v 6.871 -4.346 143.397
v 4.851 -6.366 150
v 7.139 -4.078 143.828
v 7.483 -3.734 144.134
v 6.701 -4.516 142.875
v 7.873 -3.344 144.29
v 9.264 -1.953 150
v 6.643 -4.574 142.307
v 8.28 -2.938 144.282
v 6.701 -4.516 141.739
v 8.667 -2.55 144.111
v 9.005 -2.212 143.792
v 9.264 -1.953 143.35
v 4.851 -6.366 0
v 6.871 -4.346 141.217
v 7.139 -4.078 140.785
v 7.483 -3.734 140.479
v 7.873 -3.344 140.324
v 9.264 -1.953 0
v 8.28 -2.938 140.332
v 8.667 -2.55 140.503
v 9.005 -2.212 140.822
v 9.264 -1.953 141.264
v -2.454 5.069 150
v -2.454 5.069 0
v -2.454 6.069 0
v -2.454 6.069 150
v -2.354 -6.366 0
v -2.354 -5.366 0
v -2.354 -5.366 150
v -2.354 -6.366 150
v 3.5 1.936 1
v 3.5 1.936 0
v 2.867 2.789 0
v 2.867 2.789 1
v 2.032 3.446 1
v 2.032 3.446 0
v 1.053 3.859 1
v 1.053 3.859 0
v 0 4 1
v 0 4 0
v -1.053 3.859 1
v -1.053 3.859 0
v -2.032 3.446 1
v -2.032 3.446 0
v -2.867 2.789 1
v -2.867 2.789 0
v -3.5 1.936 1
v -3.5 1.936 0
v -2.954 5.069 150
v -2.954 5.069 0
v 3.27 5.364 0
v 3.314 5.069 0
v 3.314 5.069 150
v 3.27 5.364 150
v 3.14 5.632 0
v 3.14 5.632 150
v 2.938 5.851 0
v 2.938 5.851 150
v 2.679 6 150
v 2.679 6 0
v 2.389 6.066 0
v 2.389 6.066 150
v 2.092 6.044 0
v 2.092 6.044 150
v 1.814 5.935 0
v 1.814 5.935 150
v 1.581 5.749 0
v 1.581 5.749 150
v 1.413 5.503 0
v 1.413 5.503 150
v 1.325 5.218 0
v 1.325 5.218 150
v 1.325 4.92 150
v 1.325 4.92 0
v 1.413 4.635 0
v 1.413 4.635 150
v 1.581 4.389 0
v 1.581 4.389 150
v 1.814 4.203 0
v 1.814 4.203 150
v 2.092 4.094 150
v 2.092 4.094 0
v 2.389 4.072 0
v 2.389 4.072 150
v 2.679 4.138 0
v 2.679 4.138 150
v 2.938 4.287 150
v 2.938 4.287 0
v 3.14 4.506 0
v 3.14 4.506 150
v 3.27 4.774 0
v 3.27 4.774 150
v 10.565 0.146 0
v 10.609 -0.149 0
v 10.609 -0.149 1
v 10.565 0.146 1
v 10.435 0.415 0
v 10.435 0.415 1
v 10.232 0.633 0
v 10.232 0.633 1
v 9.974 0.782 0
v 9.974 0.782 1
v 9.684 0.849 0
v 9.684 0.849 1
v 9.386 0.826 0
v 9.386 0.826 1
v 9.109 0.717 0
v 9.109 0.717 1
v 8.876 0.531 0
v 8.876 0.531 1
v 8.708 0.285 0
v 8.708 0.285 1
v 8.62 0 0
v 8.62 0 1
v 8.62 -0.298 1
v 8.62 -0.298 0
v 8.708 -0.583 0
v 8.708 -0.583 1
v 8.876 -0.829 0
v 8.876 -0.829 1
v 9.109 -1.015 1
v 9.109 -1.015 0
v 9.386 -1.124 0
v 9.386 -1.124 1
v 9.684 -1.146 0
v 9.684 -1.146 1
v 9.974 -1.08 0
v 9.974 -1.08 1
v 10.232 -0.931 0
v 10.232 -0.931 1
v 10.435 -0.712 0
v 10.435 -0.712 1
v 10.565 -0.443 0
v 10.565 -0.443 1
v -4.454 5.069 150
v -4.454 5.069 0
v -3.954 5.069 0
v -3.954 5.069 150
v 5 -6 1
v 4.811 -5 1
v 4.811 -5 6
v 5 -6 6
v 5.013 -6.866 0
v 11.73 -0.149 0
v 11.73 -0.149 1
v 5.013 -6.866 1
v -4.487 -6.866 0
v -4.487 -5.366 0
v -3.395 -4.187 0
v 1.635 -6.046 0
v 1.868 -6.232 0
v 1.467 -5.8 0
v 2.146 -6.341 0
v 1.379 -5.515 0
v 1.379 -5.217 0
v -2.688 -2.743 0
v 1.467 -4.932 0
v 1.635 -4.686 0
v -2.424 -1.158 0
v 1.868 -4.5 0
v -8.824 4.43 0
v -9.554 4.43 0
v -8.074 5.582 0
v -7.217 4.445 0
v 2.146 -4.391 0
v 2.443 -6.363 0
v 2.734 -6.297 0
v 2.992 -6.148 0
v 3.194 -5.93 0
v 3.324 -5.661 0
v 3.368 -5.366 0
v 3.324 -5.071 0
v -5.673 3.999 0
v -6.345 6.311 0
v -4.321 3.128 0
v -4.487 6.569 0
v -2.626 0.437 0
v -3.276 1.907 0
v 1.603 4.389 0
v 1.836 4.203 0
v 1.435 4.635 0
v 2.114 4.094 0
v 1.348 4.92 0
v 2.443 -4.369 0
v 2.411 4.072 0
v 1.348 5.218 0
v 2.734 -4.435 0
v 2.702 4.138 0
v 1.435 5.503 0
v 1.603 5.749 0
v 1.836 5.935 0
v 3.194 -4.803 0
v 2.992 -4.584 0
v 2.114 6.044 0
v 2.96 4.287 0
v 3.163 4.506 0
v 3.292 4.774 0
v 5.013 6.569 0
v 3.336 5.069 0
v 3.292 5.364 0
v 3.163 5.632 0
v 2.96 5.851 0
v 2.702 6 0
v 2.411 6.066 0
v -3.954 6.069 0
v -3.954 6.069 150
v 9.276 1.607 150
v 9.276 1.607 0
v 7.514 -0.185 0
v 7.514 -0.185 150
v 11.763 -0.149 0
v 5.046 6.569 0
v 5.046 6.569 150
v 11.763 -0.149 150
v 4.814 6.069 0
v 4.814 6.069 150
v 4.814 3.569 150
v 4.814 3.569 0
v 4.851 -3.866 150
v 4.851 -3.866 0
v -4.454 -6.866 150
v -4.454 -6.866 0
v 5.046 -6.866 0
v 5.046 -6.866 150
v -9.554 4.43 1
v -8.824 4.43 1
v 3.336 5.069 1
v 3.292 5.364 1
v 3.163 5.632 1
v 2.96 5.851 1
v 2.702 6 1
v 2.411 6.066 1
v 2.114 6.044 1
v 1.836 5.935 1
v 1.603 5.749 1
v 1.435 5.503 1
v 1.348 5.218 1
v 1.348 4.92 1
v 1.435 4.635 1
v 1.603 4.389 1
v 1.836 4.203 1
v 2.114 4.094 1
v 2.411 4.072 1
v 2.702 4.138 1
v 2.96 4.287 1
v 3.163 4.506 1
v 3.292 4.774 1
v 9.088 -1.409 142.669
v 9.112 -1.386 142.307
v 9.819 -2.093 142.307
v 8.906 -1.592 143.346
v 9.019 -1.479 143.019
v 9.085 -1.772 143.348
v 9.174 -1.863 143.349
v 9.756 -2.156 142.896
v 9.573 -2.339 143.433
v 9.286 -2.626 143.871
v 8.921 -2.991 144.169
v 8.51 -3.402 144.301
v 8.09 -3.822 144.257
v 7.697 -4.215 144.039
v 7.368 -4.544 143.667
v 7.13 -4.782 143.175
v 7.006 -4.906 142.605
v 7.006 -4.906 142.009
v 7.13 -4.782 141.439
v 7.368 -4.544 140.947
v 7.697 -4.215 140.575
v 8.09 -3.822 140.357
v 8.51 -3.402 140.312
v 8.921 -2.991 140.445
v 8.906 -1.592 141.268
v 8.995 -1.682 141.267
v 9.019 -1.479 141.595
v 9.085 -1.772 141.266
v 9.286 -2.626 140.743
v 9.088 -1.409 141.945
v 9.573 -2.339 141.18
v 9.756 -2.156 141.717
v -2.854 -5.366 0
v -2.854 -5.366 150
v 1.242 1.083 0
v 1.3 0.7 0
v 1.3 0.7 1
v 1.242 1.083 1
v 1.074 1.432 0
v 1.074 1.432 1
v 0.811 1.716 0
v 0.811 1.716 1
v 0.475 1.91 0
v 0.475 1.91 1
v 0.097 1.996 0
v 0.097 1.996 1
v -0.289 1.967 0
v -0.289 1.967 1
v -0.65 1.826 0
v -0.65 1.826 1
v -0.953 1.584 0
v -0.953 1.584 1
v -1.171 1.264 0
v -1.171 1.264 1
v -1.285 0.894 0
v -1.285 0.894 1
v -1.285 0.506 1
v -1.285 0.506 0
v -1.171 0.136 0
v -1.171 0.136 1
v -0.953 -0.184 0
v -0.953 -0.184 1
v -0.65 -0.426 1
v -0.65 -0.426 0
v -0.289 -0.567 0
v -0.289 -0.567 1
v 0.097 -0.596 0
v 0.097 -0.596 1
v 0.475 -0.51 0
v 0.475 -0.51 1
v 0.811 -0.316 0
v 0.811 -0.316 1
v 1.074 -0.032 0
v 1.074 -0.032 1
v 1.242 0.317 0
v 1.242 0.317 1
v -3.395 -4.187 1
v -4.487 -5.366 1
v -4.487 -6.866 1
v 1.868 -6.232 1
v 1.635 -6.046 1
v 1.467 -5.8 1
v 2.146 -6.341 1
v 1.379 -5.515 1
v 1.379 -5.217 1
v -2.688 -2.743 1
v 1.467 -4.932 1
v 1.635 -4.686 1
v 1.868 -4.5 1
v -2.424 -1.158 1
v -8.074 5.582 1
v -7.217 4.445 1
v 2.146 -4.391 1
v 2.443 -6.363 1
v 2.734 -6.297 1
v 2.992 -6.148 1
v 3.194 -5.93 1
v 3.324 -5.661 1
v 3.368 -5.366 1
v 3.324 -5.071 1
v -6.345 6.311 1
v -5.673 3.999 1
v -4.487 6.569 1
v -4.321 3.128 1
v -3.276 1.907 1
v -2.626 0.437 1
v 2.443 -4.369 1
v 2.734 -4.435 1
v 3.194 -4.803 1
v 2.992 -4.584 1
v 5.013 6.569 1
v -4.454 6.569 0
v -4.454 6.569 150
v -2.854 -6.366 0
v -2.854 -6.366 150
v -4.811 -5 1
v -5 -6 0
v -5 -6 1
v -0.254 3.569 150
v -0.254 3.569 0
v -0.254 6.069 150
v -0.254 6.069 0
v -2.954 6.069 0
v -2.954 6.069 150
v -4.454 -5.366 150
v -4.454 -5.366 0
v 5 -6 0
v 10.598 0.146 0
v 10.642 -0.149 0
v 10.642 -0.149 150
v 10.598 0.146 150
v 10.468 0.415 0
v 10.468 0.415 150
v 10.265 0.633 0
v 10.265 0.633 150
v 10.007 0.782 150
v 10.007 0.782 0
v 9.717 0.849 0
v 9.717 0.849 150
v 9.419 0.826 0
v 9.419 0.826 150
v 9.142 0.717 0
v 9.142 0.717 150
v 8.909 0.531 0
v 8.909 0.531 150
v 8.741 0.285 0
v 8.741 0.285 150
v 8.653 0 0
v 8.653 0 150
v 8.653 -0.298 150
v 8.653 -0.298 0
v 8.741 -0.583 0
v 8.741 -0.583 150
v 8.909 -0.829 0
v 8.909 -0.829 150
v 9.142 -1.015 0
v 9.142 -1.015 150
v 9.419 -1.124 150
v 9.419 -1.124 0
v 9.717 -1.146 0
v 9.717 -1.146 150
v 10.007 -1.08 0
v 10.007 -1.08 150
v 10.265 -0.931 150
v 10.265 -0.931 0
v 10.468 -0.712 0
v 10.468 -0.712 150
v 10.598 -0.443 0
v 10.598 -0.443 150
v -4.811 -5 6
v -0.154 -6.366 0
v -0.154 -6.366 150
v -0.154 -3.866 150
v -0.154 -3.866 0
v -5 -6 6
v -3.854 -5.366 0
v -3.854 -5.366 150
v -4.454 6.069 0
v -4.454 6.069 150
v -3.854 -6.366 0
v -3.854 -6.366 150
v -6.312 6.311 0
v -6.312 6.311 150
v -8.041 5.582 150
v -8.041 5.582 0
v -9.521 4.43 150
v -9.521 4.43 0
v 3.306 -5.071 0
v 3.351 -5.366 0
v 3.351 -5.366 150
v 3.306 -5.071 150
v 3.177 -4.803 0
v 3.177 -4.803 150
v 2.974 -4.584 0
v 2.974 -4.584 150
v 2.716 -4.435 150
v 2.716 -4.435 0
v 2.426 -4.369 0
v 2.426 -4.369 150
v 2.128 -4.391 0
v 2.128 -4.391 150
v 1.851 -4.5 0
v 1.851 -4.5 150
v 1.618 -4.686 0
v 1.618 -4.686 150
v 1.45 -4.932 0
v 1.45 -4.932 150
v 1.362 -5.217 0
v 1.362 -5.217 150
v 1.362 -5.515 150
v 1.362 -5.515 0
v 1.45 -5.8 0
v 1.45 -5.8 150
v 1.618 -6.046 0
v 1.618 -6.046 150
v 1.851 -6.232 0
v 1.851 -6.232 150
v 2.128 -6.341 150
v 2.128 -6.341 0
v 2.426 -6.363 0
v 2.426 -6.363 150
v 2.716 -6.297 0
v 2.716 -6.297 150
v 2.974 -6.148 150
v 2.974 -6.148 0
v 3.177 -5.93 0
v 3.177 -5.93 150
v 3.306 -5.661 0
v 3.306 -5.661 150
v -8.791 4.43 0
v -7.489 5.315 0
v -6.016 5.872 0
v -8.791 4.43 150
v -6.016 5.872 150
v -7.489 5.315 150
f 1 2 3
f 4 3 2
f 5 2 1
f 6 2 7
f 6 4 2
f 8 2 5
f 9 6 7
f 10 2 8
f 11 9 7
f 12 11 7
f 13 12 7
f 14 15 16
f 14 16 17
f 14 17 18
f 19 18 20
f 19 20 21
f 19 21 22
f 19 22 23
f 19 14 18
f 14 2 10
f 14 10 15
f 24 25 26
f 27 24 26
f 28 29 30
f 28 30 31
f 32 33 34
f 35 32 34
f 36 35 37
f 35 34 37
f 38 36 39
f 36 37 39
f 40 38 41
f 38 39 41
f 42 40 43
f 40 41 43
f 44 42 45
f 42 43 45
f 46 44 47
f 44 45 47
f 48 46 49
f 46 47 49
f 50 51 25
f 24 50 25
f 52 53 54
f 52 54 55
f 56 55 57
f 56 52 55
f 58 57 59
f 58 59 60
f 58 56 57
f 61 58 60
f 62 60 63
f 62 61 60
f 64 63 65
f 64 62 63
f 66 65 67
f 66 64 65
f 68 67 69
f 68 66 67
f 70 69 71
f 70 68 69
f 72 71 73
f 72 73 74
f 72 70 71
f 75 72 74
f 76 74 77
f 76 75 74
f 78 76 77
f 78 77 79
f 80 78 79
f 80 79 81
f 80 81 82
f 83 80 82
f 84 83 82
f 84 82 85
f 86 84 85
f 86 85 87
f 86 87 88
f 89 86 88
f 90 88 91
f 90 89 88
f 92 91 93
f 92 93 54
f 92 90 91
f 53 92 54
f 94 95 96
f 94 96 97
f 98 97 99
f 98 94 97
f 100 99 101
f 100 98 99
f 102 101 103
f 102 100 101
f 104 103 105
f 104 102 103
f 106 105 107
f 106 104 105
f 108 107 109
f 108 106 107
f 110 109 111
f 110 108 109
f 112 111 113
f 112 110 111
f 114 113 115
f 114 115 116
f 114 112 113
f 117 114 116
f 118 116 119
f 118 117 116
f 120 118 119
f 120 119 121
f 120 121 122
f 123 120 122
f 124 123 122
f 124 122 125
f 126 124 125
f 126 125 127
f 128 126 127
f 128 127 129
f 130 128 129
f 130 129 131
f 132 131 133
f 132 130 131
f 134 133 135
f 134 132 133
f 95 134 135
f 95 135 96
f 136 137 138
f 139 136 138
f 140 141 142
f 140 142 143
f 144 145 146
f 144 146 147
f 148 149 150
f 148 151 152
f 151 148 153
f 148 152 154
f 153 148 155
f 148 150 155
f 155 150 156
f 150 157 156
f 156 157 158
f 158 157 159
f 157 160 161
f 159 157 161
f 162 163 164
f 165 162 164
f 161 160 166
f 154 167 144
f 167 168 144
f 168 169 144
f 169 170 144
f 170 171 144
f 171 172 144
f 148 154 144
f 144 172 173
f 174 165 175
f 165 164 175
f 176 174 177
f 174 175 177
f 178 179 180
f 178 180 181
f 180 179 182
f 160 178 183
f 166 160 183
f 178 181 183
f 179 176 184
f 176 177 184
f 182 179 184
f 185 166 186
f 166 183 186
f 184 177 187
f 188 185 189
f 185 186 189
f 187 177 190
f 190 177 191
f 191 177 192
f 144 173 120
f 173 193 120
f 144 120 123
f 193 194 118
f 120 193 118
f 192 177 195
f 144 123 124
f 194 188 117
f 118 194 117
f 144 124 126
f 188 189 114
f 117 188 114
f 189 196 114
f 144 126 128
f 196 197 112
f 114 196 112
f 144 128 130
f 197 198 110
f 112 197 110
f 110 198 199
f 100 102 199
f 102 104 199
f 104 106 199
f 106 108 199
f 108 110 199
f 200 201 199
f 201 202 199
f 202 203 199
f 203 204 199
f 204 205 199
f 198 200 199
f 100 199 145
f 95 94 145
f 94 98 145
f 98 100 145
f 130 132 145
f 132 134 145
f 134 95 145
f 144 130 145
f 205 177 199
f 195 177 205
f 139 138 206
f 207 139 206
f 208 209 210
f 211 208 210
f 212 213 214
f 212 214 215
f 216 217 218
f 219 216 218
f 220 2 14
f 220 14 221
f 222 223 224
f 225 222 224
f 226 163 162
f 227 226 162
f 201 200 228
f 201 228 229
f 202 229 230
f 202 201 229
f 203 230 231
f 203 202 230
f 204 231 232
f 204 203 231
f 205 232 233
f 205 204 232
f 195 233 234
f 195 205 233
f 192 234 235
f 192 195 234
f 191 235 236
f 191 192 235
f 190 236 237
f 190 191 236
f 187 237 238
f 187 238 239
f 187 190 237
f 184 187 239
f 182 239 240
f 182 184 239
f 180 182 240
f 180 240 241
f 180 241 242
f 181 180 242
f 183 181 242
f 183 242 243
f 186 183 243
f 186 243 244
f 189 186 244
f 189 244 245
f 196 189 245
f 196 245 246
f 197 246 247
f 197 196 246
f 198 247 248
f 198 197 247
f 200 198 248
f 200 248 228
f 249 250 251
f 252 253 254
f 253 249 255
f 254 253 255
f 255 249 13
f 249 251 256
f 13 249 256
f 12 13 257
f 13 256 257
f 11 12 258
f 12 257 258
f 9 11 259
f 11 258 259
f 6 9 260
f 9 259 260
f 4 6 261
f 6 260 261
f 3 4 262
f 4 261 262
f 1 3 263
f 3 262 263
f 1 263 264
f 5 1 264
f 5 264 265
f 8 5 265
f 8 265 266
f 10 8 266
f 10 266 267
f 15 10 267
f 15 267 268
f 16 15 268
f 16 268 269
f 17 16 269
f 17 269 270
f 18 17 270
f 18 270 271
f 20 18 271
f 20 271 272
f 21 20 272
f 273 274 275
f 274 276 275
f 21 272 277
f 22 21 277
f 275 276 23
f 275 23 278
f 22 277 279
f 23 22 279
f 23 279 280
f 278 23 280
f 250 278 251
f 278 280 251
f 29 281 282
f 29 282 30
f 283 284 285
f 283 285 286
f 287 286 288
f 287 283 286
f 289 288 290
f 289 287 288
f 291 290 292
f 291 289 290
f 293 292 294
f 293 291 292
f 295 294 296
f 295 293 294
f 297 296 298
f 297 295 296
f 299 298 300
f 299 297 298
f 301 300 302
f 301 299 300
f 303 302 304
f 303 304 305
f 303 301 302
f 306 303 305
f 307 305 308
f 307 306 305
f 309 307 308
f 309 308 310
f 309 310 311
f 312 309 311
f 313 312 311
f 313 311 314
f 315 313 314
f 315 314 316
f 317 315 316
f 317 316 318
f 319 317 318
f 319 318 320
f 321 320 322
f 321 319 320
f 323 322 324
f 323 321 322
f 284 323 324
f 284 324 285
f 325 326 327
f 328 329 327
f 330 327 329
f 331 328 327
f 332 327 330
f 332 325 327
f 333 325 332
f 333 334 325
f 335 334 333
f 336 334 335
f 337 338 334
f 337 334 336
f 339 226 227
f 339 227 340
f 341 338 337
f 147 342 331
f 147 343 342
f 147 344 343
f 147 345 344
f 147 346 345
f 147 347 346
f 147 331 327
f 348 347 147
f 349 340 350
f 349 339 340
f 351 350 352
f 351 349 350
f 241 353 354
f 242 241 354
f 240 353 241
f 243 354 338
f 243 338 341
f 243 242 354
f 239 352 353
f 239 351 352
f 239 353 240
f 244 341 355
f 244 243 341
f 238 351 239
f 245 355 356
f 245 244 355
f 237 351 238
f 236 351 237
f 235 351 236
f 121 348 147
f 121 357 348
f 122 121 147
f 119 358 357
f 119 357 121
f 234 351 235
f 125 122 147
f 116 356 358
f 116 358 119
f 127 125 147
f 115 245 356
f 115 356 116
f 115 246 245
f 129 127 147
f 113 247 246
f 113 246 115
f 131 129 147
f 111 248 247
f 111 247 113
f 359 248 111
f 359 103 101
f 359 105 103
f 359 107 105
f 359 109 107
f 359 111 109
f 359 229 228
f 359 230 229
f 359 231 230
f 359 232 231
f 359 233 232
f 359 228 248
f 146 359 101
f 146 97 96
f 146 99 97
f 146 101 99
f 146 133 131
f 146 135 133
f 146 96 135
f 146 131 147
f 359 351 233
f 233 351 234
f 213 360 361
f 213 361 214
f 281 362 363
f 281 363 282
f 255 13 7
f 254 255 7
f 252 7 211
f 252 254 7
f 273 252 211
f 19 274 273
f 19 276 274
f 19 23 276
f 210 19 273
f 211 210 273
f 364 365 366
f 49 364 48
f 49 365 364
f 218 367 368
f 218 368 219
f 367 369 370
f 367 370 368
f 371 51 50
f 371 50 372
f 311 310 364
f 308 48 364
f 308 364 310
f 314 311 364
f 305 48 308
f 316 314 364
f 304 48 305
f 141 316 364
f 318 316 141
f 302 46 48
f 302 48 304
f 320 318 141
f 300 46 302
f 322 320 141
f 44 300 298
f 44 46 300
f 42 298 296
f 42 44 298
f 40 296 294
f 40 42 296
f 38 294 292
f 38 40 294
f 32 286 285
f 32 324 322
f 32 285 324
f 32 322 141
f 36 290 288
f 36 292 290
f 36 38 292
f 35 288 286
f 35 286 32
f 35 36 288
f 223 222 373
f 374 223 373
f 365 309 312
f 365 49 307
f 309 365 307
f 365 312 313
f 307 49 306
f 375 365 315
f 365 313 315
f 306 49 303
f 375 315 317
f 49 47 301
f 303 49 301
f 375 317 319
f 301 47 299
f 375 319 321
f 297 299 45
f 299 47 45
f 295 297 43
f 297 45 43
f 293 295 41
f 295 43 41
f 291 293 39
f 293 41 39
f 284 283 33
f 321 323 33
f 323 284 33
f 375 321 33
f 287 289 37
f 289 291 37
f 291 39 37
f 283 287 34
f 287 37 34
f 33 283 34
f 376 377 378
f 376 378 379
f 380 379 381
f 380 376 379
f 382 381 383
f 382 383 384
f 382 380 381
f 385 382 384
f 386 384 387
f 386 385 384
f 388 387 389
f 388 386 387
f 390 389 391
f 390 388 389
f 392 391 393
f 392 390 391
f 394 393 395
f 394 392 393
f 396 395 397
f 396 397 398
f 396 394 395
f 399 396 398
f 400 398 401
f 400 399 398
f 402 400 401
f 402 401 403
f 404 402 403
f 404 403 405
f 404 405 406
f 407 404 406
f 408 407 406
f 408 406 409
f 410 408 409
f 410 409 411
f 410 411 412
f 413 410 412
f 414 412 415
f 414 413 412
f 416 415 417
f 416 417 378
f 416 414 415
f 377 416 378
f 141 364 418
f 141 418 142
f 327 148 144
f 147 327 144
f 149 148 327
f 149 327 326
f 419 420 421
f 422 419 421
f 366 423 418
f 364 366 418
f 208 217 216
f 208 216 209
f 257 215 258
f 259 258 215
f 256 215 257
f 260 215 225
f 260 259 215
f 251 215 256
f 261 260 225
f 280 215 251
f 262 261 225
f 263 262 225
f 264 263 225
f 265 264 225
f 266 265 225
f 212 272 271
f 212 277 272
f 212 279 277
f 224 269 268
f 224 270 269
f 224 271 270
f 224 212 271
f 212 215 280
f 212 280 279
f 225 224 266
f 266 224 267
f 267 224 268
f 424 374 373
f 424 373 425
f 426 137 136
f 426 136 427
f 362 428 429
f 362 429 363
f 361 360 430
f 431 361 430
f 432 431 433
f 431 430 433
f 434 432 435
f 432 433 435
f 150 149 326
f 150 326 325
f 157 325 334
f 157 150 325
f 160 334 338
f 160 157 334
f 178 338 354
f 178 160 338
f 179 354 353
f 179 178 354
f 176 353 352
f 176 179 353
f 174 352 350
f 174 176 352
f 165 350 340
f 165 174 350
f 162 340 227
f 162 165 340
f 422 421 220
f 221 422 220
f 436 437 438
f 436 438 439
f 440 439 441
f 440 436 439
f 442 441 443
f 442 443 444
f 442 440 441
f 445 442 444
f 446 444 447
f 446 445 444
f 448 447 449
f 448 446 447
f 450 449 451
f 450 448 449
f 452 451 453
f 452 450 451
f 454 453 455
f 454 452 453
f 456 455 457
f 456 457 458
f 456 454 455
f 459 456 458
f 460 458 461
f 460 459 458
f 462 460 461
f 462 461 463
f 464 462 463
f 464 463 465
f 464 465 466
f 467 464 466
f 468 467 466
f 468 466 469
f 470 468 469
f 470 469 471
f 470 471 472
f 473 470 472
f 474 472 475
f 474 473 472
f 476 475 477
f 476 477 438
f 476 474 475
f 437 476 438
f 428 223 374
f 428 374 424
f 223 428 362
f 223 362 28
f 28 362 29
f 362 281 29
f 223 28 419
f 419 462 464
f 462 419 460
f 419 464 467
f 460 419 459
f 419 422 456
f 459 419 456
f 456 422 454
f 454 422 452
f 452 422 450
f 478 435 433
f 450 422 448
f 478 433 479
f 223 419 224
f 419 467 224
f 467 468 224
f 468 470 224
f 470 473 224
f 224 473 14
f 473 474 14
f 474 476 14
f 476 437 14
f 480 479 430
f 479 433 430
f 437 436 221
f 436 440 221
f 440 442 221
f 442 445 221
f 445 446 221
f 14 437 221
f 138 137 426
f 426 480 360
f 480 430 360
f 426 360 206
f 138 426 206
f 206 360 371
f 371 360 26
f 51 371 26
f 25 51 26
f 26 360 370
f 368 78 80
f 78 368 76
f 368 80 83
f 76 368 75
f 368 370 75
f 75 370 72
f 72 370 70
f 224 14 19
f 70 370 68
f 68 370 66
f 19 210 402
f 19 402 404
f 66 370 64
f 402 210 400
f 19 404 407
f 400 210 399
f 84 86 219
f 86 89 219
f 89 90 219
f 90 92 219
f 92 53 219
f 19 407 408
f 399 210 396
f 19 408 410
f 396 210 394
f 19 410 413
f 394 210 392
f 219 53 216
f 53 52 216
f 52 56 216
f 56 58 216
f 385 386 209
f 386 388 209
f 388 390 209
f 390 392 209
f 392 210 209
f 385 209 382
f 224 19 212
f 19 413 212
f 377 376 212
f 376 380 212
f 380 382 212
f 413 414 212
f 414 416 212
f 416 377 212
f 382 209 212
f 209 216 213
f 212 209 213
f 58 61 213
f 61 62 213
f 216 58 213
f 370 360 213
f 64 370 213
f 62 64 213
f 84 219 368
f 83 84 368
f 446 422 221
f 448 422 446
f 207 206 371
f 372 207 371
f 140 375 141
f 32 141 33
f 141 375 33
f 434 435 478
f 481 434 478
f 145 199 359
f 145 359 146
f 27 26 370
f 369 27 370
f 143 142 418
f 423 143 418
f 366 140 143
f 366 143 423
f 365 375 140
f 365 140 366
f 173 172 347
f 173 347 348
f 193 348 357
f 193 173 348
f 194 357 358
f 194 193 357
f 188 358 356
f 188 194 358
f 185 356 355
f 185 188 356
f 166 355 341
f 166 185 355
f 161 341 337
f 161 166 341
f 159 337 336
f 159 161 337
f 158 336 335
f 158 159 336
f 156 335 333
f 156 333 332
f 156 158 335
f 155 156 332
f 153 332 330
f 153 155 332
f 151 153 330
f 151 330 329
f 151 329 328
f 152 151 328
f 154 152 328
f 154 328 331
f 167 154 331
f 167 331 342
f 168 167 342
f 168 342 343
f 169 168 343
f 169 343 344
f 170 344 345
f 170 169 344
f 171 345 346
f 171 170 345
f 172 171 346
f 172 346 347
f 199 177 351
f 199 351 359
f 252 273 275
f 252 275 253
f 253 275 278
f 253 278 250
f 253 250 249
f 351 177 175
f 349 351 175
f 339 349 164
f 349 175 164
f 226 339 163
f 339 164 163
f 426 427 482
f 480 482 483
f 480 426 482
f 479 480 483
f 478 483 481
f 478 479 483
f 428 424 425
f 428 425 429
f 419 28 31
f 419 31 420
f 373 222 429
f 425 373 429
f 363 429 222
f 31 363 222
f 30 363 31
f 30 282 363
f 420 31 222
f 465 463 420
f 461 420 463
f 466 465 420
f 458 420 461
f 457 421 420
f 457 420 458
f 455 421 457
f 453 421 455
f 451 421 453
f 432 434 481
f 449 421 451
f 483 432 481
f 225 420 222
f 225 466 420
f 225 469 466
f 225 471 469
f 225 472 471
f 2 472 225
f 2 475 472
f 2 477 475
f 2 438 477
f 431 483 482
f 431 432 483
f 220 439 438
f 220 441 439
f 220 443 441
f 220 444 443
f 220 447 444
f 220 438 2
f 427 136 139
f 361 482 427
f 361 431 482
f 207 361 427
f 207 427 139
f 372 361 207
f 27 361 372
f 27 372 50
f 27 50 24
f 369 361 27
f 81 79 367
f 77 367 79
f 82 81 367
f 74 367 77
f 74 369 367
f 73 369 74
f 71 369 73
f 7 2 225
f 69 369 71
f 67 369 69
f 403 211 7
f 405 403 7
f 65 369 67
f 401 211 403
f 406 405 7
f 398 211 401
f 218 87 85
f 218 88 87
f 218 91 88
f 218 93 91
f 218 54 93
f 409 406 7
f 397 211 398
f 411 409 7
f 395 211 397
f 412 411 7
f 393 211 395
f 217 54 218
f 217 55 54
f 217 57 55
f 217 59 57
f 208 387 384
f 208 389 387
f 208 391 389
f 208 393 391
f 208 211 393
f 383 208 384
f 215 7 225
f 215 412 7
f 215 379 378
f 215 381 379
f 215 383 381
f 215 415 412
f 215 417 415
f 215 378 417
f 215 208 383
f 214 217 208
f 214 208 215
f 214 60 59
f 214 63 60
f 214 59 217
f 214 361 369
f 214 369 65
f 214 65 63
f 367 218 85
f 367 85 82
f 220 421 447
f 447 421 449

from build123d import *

# Parameters (mm, degrees)
SKETCH_R     = 1
PAD_DEPTH    = 150
SKETCH004_R  = 2
POCKET_DEPTH = 1
SKETCH001_R  = 1
PAD001_DEPTH = 1
SKETCH005_R  = 1.3
PAD002_DEPTH = 1
PAD003_DEPTH = 5


with BuildPart() as body:
    # Sketch → Pad (new body)
    with BuildSketch(Plane.XY):
        with BuildLine():
            Line((-4.454193, -6.866201), (5.045807, -6.866201))
            Line((11.763321, -0.148687), (5.045807, -6.866201))
            Line((5.045807, 6.568828), (11.763321, -0.148687))
            Line((-4.454193, 6.568828), (5.045807, 6.568828))
            ThreePointArc((-4.454193, 6.568828), (-7.200425, 6.003205), (-9.521158, 4.4297))
            Line((-9.521158, 4.4297), (-8.791158, 4.4297))
            ThreePointArc((-4.454193, 6.068828), (-6.769302, 5.637222), (-8.791158, 4.4297))
            Line((-4.454193, 5.068828), (-4.454193, 6.068828))
            Line((-4.454193, 5.068828), (-3.954193, 5.068828))
            Line((-3.954193, 5.068828), (-3.954193, 6.068828))
            Line((-3.954193, 6.068828), (-2.954193, 6.068828))
            Line((-2.954193, 5.068828), (-2.954193, 6.068828))
            Line((-2.954193, 5.068828), (-2.454193, 5.068828))
            Line((-2.454193, 5.068828), (-2.454193, 6.068828))
            Line((-2.454193, 6.068828), (-0.254193, 6.068828))
            Line((-0.254193, 6.068828), (-0.254193, 3.568828))
            Line((-0.254193, 3.568828), (4.814107, 3.568828))
            Line((4.814107, 6.068828), (4.814107, 3.568828))
            Line((4.814107, 6.068828), (9.27618, 1.606755))
            Line((9.27618, 1.606755), (7.513507, -0.185418))
            Line((9.263853, -1.953186), (7.513507, -0.185418))
            Line((4.850837, -6.366201), (9.263853, -1.953186))
            Line((4.850837, -6.366201), (4.850837, -3.866201))
            Line((-0.154193, -3.866201), (4.850837, -3.866201))
            Line((-0.154193, -6.366201), (-0.154193, -3.866201))
            Line((-2.354193, -6.366201), (-0.154193, -6.366201))
            Line((-2.354193, -5.366201), (-2.354193, -6.366201))
            Line((-2.854193, -5.366201), (-2.354193, -5.366201))
            Line((-2.854193, -6.366201), (-2.854193, -5.366201))
            Line((-3.854193, -6.366201), (-2.854193, -6.366201))
            Line((-3.854193, -5.366201), (-3.854193, -6.366201))
            Line((-4.454193, -5.366201), (-3.854193, -5.366201))
            Line((-4.454193, -6.866201), (-4.454193, -5.366201))
        make_face()
        with Locations((2.350837, -5.366201)):
            Circle(SKETCH_R, mode=Mode.SUBTRACT)
        with Locations((2.314107, 5.068828)):
            Circle(SKETCH_R, mode=Mode.SUBTRACT)
        with Locations((9.642001, -0.148687)):
            Circle(SKETCH_R, mode=Mode.SUBTRACT)
    extrude(amount=PAD_DEPTH)

    # Sketch004 (on Face2 of Pad) → Pocket (cut)
    with BuildSketch(Plane(origin=(5.956004, -5.956004, 0), x_dir=(0.707107, 0.707107, 0), z_dir=(0.707107, -0.707107, 0))):
        with Locations((3.462787, 142.306854)):
            Circle(SKETCH004_R)
    extrude(amount=-POCKET_DEPTH, mode=Mode.SUBTRACT)


with BuildPart() as body001:
    # Sketch001 → Pad001 (new body)
    with BuildSketch(Plane.XY):
        with BuildLine():
            Line((-4.487243, -6.866201), (5.012757, -6.866201))
            Line((11.730272, -0.148687), (5.012757, -6.866201))
            Line((5.012757, 6.568828), (11.730272, -0.148687))
            Line((-4.487243, 6.568828), (5.012757, 6.568828))
            ThreePointArc((-4.487243, 6.568828), (-7.233475, 6.003205), (-9.554208, 4.4297))
            Line((-9.554208, 4.4297), (-8.824208, 4.4297))
            ThreePointArc((-4.487243, -5.366201), (-2.897395, 1.195685), (-8.824208, 4.4297))
            Line((-4.487243, -6.866201), (-4.487243, -5.366201))
        make_face()
        with Locations((2.368258, -5.366201)):
            Circle(SKETCH001_R, mode=Mode.SUBTRACT)
        with Locations((2.336373, 5.068828)):
            Circle(SKETCH001_R, mode=Mode.SUBTRACT)
        with Locations((9.608951, -0.148687)):
            Circle(SKETCH001_R, mode=Mode.SUBTRACT)
    extrude(amount=PAD001_DEPTH)


with BuildPart() as body002:
    # Sketch005 → Pad002 (new body)
    with BuildSketch(Plane.XY):
        with BuildLine():
            ThreePointArc((3.5, 1.936492), (0, 4), (-3.5, 1.936492))
            Line((-5, -6), (-3.5, 1.936492))
            Line((-5, -6), (5, -6))
            Line((5, -6), (3.5, 1.936492))
        make_face()
        with Locations((0, 0.7)):
            Circle(SKETCH005_R, mode=Mode.SUBTRACT)
    extrude(amount=PAD002_DEPTH)

    # Sketch006 (on Face7 of Pad002) → Pad003 (join)
    with BuildSketch(Plane.XY.offset(1)):
        Polygon((-4.811, -5), (4.811, -5), (5, -6), (-5, -6), align=None)
    extrude(amount=PAD003_DEPTH)


solid = Compound([body.part, body001.part, body002.part])
